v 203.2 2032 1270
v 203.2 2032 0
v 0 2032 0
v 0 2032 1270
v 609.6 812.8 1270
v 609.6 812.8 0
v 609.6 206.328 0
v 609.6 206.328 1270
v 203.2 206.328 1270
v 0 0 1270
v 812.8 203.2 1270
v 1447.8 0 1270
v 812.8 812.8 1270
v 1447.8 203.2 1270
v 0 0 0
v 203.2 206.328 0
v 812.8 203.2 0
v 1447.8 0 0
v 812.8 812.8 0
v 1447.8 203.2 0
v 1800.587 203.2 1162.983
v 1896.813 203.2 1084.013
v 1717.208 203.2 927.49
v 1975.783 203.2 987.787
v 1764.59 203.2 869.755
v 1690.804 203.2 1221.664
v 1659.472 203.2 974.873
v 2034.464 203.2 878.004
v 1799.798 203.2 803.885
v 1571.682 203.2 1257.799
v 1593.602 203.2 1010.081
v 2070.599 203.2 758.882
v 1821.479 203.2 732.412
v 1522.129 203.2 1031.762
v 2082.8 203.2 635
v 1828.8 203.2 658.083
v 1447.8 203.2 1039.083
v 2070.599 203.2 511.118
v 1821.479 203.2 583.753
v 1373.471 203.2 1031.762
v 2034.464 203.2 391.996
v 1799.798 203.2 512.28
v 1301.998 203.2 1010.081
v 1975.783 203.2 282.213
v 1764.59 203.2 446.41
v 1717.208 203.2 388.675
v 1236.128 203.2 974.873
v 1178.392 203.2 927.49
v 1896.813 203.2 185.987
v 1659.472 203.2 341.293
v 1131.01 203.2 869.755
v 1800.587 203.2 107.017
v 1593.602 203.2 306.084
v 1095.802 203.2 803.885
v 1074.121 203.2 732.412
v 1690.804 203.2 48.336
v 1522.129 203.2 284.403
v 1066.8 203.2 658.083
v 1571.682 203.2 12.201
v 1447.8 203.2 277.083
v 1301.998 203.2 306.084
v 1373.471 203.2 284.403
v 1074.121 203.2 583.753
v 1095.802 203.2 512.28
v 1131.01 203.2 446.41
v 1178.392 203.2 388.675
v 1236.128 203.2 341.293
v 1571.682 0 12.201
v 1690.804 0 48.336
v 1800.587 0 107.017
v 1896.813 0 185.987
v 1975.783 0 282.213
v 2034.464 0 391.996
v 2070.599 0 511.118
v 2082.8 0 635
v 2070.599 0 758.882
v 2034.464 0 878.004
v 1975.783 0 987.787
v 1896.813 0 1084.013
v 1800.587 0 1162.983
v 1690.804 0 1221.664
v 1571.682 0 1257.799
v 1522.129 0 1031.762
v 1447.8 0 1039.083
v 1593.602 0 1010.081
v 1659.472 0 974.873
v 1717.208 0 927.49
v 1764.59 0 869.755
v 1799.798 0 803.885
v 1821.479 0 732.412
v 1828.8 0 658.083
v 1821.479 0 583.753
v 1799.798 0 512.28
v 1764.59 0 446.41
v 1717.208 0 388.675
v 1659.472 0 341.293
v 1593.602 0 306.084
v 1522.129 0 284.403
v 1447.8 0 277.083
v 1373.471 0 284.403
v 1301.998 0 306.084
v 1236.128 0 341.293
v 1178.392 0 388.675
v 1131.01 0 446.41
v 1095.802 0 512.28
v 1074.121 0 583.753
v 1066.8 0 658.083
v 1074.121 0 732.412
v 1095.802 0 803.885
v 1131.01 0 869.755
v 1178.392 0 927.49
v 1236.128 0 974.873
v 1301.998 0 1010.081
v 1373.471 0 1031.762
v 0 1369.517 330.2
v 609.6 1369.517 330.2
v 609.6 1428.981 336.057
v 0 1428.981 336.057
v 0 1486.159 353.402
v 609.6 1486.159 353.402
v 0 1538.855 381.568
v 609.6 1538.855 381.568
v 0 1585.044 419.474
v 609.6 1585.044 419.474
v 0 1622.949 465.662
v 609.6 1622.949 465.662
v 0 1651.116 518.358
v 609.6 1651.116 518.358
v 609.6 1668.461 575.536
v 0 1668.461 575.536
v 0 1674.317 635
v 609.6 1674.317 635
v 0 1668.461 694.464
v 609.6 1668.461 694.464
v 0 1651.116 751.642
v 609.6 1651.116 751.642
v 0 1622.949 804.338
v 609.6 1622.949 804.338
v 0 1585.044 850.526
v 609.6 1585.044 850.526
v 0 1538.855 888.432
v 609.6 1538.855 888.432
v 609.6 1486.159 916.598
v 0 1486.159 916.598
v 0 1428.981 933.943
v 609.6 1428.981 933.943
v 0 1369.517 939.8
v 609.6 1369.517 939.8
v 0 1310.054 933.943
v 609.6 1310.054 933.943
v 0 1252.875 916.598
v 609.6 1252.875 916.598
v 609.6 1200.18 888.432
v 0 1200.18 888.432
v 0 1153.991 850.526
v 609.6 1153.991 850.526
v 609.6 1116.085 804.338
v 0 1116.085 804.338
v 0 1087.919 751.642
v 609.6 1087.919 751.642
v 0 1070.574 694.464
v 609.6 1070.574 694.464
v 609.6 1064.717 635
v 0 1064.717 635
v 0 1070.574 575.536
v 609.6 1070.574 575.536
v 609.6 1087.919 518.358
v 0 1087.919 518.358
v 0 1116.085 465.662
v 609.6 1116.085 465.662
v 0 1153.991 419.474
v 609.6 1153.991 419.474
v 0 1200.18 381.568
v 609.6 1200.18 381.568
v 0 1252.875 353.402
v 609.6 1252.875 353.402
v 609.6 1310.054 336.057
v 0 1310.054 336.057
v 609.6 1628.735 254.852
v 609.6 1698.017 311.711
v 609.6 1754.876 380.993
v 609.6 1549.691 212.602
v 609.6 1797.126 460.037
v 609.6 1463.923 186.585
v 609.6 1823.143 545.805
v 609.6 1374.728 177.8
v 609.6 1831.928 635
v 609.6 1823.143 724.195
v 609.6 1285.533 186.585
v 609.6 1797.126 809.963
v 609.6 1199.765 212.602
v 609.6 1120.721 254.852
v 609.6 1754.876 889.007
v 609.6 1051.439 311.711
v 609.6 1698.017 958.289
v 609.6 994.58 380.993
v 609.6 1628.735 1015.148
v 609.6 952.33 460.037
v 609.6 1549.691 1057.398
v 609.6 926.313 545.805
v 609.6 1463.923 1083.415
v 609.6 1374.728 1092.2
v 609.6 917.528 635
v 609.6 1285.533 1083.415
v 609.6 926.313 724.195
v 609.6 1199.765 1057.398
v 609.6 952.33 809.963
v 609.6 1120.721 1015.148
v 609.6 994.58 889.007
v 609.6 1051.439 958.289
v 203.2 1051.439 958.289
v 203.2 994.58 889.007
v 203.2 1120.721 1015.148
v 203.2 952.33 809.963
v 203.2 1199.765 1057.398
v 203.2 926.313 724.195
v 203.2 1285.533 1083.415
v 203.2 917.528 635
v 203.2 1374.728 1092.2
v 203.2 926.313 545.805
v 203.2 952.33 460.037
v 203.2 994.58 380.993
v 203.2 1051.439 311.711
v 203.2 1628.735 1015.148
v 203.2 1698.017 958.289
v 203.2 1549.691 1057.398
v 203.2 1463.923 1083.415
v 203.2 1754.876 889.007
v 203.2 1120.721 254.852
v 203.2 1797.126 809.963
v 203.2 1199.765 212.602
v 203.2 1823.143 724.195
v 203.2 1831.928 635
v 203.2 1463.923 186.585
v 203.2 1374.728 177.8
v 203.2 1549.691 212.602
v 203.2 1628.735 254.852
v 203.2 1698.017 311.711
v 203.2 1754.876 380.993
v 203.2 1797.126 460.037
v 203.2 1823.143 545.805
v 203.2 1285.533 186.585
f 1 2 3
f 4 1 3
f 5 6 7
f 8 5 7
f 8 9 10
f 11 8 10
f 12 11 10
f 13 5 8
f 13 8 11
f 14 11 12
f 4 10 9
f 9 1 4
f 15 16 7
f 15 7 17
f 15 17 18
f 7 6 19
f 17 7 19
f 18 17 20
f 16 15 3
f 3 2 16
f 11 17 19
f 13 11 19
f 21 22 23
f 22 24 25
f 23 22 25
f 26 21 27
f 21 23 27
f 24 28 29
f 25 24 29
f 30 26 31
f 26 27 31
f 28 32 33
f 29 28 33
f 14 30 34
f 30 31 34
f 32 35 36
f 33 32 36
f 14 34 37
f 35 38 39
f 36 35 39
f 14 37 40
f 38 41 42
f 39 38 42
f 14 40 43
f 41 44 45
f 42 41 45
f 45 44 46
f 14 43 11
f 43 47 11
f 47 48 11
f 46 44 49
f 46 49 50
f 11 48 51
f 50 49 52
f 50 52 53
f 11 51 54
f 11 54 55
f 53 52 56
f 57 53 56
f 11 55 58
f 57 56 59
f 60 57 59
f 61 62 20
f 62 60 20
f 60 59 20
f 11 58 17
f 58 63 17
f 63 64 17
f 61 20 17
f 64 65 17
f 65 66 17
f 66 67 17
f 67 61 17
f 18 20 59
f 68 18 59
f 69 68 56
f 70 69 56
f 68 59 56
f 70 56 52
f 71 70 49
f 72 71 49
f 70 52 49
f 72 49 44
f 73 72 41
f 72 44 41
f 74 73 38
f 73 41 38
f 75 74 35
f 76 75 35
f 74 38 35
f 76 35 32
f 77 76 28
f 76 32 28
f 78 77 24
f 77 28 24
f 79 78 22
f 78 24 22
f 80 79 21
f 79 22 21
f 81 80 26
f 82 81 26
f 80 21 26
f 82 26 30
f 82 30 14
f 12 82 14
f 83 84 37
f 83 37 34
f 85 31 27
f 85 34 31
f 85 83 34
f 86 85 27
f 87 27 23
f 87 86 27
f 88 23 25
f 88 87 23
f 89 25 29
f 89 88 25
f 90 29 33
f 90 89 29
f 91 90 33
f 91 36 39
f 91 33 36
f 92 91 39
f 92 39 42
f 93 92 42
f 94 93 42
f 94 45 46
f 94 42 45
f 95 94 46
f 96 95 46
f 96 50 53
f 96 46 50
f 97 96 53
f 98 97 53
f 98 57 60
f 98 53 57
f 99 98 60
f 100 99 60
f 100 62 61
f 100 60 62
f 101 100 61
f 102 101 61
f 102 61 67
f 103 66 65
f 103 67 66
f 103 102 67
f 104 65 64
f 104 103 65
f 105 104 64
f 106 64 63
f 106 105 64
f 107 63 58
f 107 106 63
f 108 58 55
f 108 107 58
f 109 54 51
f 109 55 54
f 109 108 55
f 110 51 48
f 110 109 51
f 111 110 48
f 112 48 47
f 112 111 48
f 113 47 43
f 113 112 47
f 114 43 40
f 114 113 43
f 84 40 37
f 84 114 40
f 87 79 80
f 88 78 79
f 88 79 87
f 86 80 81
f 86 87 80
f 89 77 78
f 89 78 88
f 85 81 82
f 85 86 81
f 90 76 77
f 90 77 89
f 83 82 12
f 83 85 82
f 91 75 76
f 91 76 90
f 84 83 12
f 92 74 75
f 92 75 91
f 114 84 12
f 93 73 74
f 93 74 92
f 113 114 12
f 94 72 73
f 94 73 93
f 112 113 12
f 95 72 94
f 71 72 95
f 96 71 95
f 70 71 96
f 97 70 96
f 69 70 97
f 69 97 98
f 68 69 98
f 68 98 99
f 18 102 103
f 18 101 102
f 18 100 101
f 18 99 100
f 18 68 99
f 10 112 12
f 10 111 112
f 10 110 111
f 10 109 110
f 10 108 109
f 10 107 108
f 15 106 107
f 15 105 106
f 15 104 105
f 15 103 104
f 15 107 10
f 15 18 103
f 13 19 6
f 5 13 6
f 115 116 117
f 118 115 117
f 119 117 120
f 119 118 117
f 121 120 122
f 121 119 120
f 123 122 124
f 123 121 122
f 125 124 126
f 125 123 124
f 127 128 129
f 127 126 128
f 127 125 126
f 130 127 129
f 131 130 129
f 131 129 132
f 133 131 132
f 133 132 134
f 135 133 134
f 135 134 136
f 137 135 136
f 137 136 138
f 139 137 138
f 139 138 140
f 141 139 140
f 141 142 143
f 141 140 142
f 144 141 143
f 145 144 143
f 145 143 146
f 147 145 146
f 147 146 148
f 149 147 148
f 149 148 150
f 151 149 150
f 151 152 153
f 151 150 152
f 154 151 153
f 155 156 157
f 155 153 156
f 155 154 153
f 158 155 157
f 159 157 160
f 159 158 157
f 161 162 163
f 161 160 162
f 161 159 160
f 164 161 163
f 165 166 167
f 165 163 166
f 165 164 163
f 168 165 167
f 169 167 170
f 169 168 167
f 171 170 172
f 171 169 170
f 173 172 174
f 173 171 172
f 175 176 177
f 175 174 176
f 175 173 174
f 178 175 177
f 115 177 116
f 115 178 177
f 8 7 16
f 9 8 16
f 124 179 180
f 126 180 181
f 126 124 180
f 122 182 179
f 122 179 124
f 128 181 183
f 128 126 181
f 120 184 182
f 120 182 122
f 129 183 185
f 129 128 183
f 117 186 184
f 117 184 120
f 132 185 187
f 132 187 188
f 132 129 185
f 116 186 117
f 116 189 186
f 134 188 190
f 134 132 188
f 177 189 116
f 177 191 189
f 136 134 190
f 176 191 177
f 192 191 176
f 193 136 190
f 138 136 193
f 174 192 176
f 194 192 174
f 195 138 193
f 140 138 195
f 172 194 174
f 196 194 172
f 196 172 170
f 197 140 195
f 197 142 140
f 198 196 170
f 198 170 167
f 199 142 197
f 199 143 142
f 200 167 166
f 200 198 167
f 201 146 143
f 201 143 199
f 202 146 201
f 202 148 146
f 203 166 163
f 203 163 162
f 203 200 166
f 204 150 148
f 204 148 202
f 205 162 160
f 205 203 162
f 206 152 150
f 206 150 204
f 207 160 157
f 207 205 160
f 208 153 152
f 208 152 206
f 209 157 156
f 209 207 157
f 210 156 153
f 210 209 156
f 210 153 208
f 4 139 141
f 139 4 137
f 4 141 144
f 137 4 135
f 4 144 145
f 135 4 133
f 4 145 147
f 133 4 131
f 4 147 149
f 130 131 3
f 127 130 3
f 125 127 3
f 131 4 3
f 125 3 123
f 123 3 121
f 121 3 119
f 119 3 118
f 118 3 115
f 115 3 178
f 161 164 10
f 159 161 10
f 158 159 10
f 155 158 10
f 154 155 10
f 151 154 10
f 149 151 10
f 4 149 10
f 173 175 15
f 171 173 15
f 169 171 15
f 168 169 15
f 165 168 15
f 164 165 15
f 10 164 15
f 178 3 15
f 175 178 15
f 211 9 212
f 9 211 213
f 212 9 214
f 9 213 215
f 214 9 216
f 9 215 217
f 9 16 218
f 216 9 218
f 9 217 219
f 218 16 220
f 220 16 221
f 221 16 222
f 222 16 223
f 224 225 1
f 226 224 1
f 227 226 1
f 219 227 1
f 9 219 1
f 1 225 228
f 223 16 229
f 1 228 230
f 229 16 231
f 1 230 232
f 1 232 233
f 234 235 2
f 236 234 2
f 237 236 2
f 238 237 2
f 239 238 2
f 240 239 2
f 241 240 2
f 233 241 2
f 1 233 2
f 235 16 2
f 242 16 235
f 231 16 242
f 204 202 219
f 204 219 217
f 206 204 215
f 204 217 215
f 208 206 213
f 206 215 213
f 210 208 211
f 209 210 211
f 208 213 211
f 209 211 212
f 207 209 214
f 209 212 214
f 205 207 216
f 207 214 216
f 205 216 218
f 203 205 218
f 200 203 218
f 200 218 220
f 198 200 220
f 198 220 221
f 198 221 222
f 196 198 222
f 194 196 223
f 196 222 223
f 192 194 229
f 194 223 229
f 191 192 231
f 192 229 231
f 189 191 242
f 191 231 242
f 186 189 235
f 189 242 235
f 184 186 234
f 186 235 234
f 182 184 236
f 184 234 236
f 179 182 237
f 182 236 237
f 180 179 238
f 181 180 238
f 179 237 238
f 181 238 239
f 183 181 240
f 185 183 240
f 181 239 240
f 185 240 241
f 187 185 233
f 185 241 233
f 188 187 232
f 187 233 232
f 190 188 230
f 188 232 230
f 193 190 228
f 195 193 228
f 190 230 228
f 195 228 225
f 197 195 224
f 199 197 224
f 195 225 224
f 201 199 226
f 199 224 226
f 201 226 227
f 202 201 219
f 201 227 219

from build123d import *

# Parameters (mm, degrees)
Y_KSEKLIK_EKSTR_ZYON1_DEPTH = 1270
Y_KSEKLIK_EKSTR_ZYON2_DEPTH = 203.2
KES_EKSTR_ZYON1_DEPTH       = 3049.846549107
KES_EKSTR_ZYON1_DEPTH_BACK  = 3049.846549107
IZIM3_R                     = 381
IZIM4_R                     = 457.2
Y_KSEKLIK_EKSTR_ZYON3_DEPTH = 406.4
KES_EKSTR_ZYON2_DEPTH       = 2813.870818221
KES_EKSTR_ZYON2_DEPTH_BACK  = 2813.870818221
IZIM5_R                     = 304.8


with BuildPart() as part:
    # Çizim1 → Yükseklik-Ekstrüzyon1 (new body)
    with BuildSketch(Plane.XY):
        Polygon((0, 2032), (0, 0), (1447.8, 0), (1447.8, 203.2), (812.8, 203.2), (812.8, 812.8), (609.6, 812.8), (609.6, 206.327883969), (203.2, 206.327883969), (203.2, 2032), align=None)
    extrude(amount=Y_KSEKLIK_EKSTR_ZYON1_DEPTH)

    # Çizim2 → Yükseklik-Ekstrüzyon2 (add)
    with BuildSketch(Plane(origin=(0, 203.2, 0), x_dir=(1, 0, 0), z_dir=(0, 1, 0))):
        with BuildLine():
            Line((1447.8, -1270), (1447.8, 0))
            ThreePointArc((1447.8, 0), (2082.8, -635), (1447.8, -1270))
        make_face()
    extrude(amount=-Y_KSEKLIK_EKSTR_ZYON2_DEPTH)

    # Çizim3 → Kes-Ekstrüzyon1 (cut, two sides: drawn at the far end of the back side and taken through both)
    with BuildSketch(Plane(origin=(0, 203.2, 0), x_dir=(1, 0, 0), z_dir=(0, 1, 0)).offset(-KES_EKSTR_ZYON1_DEPTH_BACK)):
        with Locations(Location((1447.8, -658.082587812, 0), (0, 0, 270))):
            Circle(IZIM3_R)
    extrude(amount=KES_EKSTR_ZYON1_DEPTH + KES_EKSTR_ZYON1_DEPTH_BACK, mode=Mode.SUBTRACT)

    # Çizim4 → Yükseklik-Ekstrüzyon3 (add)
    with BuildSketch(Plane(origin=(203.2, 0, 0), x_dir=(0, 0, -1), z_dir=(1, 0, 0))):
        with Locations(Location((-635, 1374.727883969, 0), (0, 0, 180))):
            Circle(IZIM4_R)
    extrude(amount=Y_KSEKLIK_EKSTR_ZYON3_DEPTH)

    # Çizim5 → Kes-Ekstrüzyon2 (cut, two sides: drawn at the far end of the back side and taken through both)
    with BuildSketch(Plane(origin=(609.6, 0, 0), x_dir=(0, 0, -1), z_dir=(1, 0, 0)).offset(-KES_EKSTR_ZYON2_DEPTH_BACK)):
        with Locations((-635, 1369.517370068)):
            Circle(IZIM5_R)
    extrude(amount=KES_EKSTR_ZYON2_DEPTH + KES_EKSTR_ZYON2_DEPTH_BACK, mode=Mode.SUBTRACT)


solid = part.part
